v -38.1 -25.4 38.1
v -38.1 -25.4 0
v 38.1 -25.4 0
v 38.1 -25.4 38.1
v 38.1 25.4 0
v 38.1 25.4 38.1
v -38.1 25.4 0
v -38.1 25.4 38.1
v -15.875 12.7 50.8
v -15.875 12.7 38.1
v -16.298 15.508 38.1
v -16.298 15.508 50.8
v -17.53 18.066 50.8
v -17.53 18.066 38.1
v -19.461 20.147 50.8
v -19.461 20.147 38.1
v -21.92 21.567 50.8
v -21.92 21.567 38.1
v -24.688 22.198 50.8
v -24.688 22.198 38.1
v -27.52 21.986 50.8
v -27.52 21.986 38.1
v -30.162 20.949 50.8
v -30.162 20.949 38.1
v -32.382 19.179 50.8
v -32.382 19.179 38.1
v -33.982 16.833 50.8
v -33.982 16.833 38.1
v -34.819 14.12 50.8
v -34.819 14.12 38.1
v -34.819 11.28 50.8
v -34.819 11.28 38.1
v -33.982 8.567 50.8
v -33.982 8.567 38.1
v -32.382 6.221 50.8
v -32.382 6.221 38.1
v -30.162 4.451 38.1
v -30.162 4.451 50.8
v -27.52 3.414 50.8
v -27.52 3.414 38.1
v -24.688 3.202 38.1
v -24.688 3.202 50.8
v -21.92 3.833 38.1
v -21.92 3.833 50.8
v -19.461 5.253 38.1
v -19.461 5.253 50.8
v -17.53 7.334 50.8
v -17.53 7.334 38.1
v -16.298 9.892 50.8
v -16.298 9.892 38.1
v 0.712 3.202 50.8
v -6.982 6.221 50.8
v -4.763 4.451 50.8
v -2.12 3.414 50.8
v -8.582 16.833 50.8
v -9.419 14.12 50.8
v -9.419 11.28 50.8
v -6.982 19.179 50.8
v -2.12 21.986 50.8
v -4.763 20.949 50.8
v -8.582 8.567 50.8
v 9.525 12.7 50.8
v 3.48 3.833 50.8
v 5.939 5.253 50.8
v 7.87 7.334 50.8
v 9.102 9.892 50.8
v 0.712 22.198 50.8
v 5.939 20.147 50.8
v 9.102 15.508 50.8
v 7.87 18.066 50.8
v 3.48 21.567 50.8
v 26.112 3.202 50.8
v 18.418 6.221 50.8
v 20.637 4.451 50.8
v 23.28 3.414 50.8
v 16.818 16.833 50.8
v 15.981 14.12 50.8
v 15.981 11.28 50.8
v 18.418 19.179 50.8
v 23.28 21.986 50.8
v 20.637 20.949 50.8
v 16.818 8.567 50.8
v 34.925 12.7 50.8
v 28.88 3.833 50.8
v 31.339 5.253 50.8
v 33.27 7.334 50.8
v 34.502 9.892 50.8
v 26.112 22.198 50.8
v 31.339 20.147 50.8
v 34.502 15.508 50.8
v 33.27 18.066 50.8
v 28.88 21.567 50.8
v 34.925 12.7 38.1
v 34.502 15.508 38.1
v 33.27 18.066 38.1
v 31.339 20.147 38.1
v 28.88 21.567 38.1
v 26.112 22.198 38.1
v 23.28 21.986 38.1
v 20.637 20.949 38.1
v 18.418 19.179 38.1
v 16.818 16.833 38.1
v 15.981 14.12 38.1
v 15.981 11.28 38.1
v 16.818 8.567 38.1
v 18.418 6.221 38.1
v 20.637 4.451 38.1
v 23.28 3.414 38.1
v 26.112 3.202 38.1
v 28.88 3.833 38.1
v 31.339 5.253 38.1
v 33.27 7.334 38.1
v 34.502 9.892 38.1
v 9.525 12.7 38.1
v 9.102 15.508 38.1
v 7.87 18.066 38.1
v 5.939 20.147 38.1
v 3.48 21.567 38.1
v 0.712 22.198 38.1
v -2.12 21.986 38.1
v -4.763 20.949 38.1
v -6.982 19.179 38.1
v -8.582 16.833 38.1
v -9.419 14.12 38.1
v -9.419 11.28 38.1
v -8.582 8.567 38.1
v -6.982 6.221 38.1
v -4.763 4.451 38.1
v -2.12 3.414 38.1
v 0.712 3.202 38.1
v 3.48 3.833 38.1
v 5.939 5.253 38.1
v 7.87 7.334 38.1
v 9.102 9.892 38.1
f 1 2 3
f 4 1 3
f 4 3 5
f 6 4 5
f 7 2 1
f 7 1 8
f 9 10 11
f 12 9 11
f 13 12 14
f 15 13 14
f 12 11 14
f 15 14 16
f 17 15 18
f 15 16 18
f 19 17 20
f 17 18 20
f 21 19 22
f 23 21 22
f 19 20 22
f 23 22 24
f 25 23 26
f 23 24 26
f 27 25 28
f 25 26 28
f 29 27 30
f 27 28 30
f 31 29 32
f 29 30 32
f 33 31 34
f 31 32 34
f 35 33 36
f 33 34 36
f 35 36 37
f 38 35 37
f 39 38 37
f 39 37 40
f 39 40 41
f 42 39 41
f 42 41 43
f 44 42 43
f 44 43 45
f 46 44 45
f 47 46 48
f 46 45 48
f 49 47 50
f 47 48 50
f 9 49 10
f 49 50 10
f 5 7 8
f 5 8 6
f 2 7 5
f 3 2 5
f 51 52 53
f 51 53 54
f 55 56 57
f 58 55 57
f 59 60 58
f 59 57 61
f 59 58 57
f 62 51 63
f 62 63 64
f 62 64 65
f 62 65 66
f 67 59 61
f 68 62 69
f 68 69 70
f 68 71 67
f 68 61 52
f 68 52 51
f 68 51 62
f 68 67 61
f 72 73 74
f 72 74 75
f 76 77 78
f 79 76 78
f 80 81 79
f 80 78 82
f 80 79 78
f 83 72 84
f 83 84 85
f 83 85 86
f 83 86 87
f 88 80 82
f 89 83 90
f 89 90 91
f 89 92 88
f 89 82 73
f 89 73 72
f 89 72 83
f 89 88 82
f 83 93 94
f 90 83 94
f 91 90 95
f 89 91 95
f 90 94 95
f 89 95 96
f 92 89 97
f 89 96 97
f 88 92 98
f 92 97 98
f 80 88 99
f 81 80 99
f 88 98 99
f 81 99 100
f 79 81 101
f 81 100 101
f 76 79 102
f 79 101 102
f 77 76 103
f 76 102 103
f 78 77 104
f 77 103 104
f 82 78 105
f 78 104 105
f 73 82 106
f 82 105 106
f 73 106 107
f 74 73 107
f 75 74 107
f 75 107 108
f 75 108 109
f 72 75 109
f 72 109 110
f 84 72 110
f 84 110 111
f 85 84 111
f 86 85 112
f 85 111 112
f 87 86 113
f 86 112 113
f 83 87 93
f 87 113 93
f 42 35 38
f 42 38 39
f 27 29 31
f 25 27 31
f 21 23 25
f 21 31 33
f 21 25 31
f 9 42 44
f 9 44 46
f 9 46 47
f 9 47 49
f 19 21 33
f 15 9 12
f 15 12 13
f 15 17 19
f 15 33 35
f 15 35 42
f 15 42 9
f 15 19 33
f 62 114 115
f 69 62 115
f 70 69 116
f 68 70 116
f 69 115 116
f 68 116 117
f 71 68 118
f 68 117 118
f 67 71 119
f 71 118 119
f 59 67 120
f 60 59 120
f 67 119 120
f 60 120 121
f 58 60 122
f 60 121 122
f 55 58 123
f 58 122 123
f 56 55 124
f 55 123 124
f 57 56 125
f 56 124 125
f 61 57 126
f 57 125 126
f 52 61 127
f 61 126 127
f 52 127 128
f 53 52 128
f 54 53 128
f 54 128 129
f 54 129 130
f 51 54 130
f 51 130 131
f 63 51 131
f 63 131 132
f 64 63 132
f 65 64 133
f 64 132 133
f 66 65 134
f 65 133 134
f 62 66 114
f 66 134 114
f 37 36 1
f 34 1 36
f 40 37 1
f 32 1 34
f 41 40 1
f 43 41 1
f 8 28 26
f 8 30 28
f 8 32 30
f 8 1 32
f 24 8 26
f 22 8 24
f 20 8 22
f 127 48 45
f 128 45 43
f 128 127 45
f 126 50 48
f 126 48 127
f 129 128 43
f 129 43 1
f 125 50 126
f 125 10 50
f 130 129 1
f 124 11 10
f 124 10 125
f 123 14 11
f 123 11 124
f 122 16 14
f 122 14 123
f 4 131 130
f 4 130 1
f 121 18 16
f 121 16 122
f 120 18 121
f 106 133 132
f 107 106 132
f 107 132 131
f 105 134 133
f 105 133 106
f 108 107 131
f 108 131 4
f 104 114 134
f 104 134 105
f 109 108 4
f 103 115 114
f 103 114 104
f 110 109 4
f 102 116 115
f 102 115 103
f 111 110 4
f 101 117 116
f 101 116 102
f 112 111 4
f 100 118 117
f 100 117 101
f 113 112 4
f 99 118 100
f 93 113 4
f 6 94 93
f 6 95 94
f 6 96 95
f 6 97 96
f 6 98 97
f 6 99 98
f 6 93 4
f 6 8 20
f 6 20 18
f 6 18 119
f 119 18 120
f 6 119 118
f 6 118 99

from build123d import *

# Parameters (mm, degrees)
F0_W     = 76.2
F0_H     = 50.8
F1_DEPTH = 38.1
F2_R     = 9.525
F3_DEPTH = 12.7


with BuildPart() as f1:
    # F0 (on Top) → F1 (new body)
    with BuildSketch(Plane.XY):
        Rectangle(F0_W, F0_H)
    extrude(amount=F1_DEPTH)

    # F2 (on face) → F3 (join)
    with BuildSketch(Plane.XY.offset(38.1)):
        with Locations((-25.4, 12.7)):
            Circle(F2_R)
        with Locations((0, 12.7)):
            Circle(F2_R)
        with Locations((25.4, 12.7)):
            Circle(F2_R)
    extrude(amount=F3_DEPTH)


solid = f1.part
